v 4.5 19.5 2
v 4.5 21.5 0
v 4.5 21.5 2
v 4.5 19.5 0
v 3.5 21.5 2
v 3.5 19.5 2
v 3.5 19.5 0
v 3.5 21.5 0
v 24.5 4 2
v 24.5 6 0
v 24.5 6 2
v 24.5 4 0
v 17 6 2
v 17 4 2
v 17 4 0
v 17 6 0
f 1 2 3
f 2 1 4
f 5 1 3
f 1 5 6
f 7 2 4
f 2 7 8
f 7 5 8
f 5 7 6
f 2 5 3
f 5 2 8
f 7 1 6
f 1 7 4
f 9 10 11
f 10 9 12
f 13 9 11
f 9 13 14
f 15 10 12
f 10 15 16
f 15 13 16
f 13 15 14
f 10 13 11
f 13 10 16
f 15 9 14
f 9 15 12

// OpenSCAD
// file: utils.scad
// Stepped rectangular connector cutout — outer pocket sized for plug housing,
// inner hole sized for connector body. Opens toward -Y; centre call on the
// connector's X/Z position at the wall inner face (Y=0).
//
// inner_w, inner_h   : connector body (X, Z)
// housing_w, housing_h : plug housing clearance (X, Z)
// protrusion         : how far connector extends beyond wall inner face
// cutout_reach       : overshoot beyond wall outer face for clean boolean
// wall_t             : wall thickness
// lip                : material between pocket floor and inner hole (default 0.5mm)
module connector_stepped_cutout(inner_w, inner_h, housing_w, housing_h,
                                  protrusion, cutout_reach, wall_t, lip=0.5, outer=true) {
    // Inner hole: tight fit, full depth (wall + protrusion)
    translate([-inner_w/2,   -cutout_reach, -inner_h/2])
        cube([inner_w,   cutout_reach + protrusion, inner_h]);
    // Outer pocket: housing clearance, depth = wall_t - lip
    if (outer)
        translate([-housing_w/2, -cutout_reach, -housing_h/2])
            cube([housing_w, cutout_reach - lip, housing_h]);
}

// Subtraction module: through-hole with chamfer+fillet groove at the outer face.
// Same chamfer→fillet math as chamfer_fillet_extrude, applied in the r-z plane.
//
// r0    : hole radius (mm)
// fr    : fillet radius (mm)
// h     : total hole depth incl. overshoot (mm)
// zt    : z of outer face in local coords (typically h - 0.1)
// alpha : min printable overhang angle from horizontal (deg)
// fn    : arc segments
module hole_chamfer_fillet_cutout(r0, fr, h, zt, alpha=55, fn=20) {
    if ($preview) {
        cylinder(r=r0, h=h, $fn=16);
    } else {
        _r_top = r0 + fr * (sin(alpha) + cos(alpha) - 1) / sin(alpha);
        _r_c   = r0 + fr * (1 - sin(alpha));
        _z_c   = zt - fr * (1 - cos(alpha));

        cylinder(r=r0, h=h, $fn=48);
        rotate_extrude($fn=48)
            polygon(concat(
                [[r0 - 0.01, zt - fr],
                 [r0 - 0.01, zt + 0.01],
                 [_r_top,    zt + 0.01],
                 [_r_c,      _z_c]],
                [for (i = [1:fn])
                    [r0 + fr - fr * sin(alpha + (90 - alpha) * i / fn),
                     zt - fr  + fr * cos(alpha + (90 - alpha) * i / fn)]]
            ));
    }
}

// Extrude a 2D child with a chamfer-to-fillet edge at the top face.
//
// The outer face (z=length) starts inset, growing outward to full size at z=length-r.
// The steep inset zone (worst overhang when printed top-face-down) is replaced by a
// straight chamfer tangent to the fillet arc at the transition angle.
//
// length : extrusion height (mm)
// r      : fillet radius (mm)
// alpha  : min printable overhang angle from horizontal (deg) — 55 is safe on X1C
// fn     : slices per section
// invert : false = outline shrinks at top (solid outer edge)
//          true  = outline expands at top (use as subtraction for cutout inner edges)
module chamfer_fillet_extrude(length, r, alpha=55, fn=20, invert=false) {
    if ($preview) {
        linear_extrude(length) children();
    } else {
        _b  = 90 - alpha;
        _zc = r * (1 - sin(_b));
        _oc = r * (cos(_b) - 1);
        _s  = invert ? -1 : 1;

        linear_extrude(length - r + 0.01) children();

        for (i = [0:fn]) {
            _zl  = r - (r - _zc) * i / fn;
            _ofs = _s * (sqrt(r*r - (r-_zl)*(r-_zl)) - r);
            translate([0, 0, length - _zl])
                linear_extrude((r - _zc) / fn + 0.01)
                    offset(_ofs) children();
        }

        for (i = [0:fn]) {
            _zl  = _zc * (fn - i) / fn;
            _ofs = _s * (_oc + tan(_b) * (_zl - _zc));
            translate([0, 0, length - _zc + _zc * i / fn])
                linear_extrude(_zc / fn + 0.01)
                    offset(_ofs) children();
        }
    }
}
// file: params.scad
// --- Display ---
display_w        = 112.5;  // display panel width  (mm) — portrait
display_h        = 170;    // display panel height (mm) — portrait
disp_thickness   =   1.25; // display panel thickness (mm)
screen_area_w    = 100;    // active screen width  (mm)
screen_area_h    = 165;    // active screen height (mm)
display_border_wide  =  9.5;  // wide border (long edge, assumed right; TBD after driver rotation)
display_border_narrow=  2.5;  // narrow border (long edge)
display_border_short =  2;    // short-edge border (top and bottom)

// --- Cavities (back shell interior) ---
elec_w         =  65;    // Pi Zero width  (mm)
elec_l         =  30;    // Pi Zero length (mm)
elec_depth     =  16;    // Pi Zero + PiSugar stack depth (mm) — 15.7mm actual
hat_w          =  30;    // Waveshare HAT width  (mm) — rotated 90° in case
hat_l          =  66;    // Waveshare HAT length (mm)
hat_depth      =   9.5;  // Waveshare HAT depth  (mm)
bat_w          =  28;    // battery width  (mm) — portrait: 28×59 footprint
bat_l          =  59;    // battery length (mm)
bat_depth      =  12.5;  // battery depth  (mm) — 10.7 body + 1.8 magnet

// --- Primitives first (no dependencies) ---
case_w         = 135;    // width  (mm) — 135mm clears 4mm nut towers with 1.5mm margin right of display
case_h         = 210;    // height (mm) — 2+170+35+2=209 → 210
front_depth    =   2;    // front bezel thickness (mm)
back_depth     =  20;    // back shell depth (mm) — elec_depth 15.7 + 2 wall + 2.3 clearance; unconfirmed
fillet_r       =   2;    // outer-edge fillet radius (mm)
edge_overhang_angle = 55; // chamfer→fillet transition (deg from horizontal); 45=safe, 55=X1C tuned
tol            = 0.2;    // FDM clearance on each mating face (mm)
wall_t         = 2;      // nominal wall thickness (mm)

// --- PiSugar flex-tab buttons (south wall) ---
btn_hinge_w   = 0.8;  // hinge strip width (mm) — right short edge, in-layer bending
btn_slot_kerf = 0.5;  // slot kerf width (mm) — 1 nozzle diameter

// --- Button area (front face, lower section below display) ---
btn_area_h     =  35;    // height of button zone at bottom of front face (mm)
btn_rows       =   2;
btn_cols       =   4;
btn_hole_tolerance = 0.2;
btn_hole_diameter = 10; // button hole diameter (mm) — physical cap sized to fit with tol clearance
btn_fillet_r   =   2;    // fillet radius on button hole outer edge (mm)
btn_zone_w     = case_w / btn_cols;   // each button is centred in its zone
btn_row_y1     = btn_area_h / 2 - 7;  // bottom row y centre
btn_row_y2     = btn_area_h / 2 + 7;  // top row y centre (closer to display)

// --- Magnet recesses (back plate inner face) ---
magnet_d            = 15;   // diameter (mm) — derived from PiSugar image; tune after measuring
magnet_recess_depth = 1.5;  // depth into back plate; leaves 0.5mm wall

// --- Mating-face rabbet/tongue joint ---
rabbet_w       = 1;      // rabbet width into inner wall face (mm)
rabbet_d       = 1.5;    // rabbet depth from mating face (mm) — 2mm coincided with HDMI outer top

// --- M2 fasteners ---
screw_boss_id  = 2.4;    // screw shank clearance diameter (mm)
screw_head_d   = 3.8;    // screw head diameter (mm) — M2 button head
screw_head_h   = 1.4;    // screw head height (mm) — sinks fully in 2mm wall
screw_depth    = 25;     // total clearance hole depth from exterior (mm)
nut_af         = 4;      // hex nut across-flats (mm)
nut_t          = 1.6;    // hex nut thickness (mm)
tower_h        = 17;     // nut tower height from front plate inner face (mm) — 17mm leaves 1mm above back floor
tower_w        = 15;     // nut tower width in Y (mm)
// Y centres of the two screws per side; symmetric around case_h/2, clear of Pi stack (Y<32)
side_screw_y   = [case_h / 2 - case_h * 0.3, case_h / 2 + case_h * 0.3];

// --- USB-C notch ---
usbc_notch_w   =  12;    // notch width  (mm)
usbc_notch_h   =   4;    // notch height (mm)

// --- Derived positions (all dependencies above) ---
// Y=0 at bottom (USB-C / south face); X=0 at left inner wall
_elec_x  = wall_t;                   // Pi Zero left edge
_elec_y  = wall_t;                   // Pi Zero bottom edge (USB-C face)
_bat_x   = wall_t + elec_w - bat_w;  // battery right edge aligned with Pi Zero right edge
_bat_y   = wall_t + elec_l;          // battery bottom edge above Pi Zero
_hat_x   = wall_t + elec_w;          // HAT left edge = Pi Zero right edge
_hat_y   = wall_t;                   // HAT bottom edge flush with Pi Zero
// Display: active area centred; wide border on right long edge
_screen_x = (case_w - screen_area_w) / 2;   // active screen X centre in case
_disp_x   = _screen_x - display_border_narrow; // panel left edge (narrow border on left)
_disp_y   = btn_area_h + (case_h - btn_area_h - display_h) / 2;  // panel vertically centred above buttons
// (boss_inset removed — corner bosses replaced by side-entry screw towers)
// main file
// LED indicator windows — print in transparent filament on a multi-material printer.
// Import alongside back.scad in your slicer and assign transparent filament to this body.
// Single-filament users: skip this file; the back shell has through-holes instead.
include <params.scad>
use <parts.scad>

// Windows sit in the back plate (Z=0..wall_t), positioned at the pi stack origin.
translate([_elec_x, _elec_y, 0])
    led_indicator_shapes(wall_t);
